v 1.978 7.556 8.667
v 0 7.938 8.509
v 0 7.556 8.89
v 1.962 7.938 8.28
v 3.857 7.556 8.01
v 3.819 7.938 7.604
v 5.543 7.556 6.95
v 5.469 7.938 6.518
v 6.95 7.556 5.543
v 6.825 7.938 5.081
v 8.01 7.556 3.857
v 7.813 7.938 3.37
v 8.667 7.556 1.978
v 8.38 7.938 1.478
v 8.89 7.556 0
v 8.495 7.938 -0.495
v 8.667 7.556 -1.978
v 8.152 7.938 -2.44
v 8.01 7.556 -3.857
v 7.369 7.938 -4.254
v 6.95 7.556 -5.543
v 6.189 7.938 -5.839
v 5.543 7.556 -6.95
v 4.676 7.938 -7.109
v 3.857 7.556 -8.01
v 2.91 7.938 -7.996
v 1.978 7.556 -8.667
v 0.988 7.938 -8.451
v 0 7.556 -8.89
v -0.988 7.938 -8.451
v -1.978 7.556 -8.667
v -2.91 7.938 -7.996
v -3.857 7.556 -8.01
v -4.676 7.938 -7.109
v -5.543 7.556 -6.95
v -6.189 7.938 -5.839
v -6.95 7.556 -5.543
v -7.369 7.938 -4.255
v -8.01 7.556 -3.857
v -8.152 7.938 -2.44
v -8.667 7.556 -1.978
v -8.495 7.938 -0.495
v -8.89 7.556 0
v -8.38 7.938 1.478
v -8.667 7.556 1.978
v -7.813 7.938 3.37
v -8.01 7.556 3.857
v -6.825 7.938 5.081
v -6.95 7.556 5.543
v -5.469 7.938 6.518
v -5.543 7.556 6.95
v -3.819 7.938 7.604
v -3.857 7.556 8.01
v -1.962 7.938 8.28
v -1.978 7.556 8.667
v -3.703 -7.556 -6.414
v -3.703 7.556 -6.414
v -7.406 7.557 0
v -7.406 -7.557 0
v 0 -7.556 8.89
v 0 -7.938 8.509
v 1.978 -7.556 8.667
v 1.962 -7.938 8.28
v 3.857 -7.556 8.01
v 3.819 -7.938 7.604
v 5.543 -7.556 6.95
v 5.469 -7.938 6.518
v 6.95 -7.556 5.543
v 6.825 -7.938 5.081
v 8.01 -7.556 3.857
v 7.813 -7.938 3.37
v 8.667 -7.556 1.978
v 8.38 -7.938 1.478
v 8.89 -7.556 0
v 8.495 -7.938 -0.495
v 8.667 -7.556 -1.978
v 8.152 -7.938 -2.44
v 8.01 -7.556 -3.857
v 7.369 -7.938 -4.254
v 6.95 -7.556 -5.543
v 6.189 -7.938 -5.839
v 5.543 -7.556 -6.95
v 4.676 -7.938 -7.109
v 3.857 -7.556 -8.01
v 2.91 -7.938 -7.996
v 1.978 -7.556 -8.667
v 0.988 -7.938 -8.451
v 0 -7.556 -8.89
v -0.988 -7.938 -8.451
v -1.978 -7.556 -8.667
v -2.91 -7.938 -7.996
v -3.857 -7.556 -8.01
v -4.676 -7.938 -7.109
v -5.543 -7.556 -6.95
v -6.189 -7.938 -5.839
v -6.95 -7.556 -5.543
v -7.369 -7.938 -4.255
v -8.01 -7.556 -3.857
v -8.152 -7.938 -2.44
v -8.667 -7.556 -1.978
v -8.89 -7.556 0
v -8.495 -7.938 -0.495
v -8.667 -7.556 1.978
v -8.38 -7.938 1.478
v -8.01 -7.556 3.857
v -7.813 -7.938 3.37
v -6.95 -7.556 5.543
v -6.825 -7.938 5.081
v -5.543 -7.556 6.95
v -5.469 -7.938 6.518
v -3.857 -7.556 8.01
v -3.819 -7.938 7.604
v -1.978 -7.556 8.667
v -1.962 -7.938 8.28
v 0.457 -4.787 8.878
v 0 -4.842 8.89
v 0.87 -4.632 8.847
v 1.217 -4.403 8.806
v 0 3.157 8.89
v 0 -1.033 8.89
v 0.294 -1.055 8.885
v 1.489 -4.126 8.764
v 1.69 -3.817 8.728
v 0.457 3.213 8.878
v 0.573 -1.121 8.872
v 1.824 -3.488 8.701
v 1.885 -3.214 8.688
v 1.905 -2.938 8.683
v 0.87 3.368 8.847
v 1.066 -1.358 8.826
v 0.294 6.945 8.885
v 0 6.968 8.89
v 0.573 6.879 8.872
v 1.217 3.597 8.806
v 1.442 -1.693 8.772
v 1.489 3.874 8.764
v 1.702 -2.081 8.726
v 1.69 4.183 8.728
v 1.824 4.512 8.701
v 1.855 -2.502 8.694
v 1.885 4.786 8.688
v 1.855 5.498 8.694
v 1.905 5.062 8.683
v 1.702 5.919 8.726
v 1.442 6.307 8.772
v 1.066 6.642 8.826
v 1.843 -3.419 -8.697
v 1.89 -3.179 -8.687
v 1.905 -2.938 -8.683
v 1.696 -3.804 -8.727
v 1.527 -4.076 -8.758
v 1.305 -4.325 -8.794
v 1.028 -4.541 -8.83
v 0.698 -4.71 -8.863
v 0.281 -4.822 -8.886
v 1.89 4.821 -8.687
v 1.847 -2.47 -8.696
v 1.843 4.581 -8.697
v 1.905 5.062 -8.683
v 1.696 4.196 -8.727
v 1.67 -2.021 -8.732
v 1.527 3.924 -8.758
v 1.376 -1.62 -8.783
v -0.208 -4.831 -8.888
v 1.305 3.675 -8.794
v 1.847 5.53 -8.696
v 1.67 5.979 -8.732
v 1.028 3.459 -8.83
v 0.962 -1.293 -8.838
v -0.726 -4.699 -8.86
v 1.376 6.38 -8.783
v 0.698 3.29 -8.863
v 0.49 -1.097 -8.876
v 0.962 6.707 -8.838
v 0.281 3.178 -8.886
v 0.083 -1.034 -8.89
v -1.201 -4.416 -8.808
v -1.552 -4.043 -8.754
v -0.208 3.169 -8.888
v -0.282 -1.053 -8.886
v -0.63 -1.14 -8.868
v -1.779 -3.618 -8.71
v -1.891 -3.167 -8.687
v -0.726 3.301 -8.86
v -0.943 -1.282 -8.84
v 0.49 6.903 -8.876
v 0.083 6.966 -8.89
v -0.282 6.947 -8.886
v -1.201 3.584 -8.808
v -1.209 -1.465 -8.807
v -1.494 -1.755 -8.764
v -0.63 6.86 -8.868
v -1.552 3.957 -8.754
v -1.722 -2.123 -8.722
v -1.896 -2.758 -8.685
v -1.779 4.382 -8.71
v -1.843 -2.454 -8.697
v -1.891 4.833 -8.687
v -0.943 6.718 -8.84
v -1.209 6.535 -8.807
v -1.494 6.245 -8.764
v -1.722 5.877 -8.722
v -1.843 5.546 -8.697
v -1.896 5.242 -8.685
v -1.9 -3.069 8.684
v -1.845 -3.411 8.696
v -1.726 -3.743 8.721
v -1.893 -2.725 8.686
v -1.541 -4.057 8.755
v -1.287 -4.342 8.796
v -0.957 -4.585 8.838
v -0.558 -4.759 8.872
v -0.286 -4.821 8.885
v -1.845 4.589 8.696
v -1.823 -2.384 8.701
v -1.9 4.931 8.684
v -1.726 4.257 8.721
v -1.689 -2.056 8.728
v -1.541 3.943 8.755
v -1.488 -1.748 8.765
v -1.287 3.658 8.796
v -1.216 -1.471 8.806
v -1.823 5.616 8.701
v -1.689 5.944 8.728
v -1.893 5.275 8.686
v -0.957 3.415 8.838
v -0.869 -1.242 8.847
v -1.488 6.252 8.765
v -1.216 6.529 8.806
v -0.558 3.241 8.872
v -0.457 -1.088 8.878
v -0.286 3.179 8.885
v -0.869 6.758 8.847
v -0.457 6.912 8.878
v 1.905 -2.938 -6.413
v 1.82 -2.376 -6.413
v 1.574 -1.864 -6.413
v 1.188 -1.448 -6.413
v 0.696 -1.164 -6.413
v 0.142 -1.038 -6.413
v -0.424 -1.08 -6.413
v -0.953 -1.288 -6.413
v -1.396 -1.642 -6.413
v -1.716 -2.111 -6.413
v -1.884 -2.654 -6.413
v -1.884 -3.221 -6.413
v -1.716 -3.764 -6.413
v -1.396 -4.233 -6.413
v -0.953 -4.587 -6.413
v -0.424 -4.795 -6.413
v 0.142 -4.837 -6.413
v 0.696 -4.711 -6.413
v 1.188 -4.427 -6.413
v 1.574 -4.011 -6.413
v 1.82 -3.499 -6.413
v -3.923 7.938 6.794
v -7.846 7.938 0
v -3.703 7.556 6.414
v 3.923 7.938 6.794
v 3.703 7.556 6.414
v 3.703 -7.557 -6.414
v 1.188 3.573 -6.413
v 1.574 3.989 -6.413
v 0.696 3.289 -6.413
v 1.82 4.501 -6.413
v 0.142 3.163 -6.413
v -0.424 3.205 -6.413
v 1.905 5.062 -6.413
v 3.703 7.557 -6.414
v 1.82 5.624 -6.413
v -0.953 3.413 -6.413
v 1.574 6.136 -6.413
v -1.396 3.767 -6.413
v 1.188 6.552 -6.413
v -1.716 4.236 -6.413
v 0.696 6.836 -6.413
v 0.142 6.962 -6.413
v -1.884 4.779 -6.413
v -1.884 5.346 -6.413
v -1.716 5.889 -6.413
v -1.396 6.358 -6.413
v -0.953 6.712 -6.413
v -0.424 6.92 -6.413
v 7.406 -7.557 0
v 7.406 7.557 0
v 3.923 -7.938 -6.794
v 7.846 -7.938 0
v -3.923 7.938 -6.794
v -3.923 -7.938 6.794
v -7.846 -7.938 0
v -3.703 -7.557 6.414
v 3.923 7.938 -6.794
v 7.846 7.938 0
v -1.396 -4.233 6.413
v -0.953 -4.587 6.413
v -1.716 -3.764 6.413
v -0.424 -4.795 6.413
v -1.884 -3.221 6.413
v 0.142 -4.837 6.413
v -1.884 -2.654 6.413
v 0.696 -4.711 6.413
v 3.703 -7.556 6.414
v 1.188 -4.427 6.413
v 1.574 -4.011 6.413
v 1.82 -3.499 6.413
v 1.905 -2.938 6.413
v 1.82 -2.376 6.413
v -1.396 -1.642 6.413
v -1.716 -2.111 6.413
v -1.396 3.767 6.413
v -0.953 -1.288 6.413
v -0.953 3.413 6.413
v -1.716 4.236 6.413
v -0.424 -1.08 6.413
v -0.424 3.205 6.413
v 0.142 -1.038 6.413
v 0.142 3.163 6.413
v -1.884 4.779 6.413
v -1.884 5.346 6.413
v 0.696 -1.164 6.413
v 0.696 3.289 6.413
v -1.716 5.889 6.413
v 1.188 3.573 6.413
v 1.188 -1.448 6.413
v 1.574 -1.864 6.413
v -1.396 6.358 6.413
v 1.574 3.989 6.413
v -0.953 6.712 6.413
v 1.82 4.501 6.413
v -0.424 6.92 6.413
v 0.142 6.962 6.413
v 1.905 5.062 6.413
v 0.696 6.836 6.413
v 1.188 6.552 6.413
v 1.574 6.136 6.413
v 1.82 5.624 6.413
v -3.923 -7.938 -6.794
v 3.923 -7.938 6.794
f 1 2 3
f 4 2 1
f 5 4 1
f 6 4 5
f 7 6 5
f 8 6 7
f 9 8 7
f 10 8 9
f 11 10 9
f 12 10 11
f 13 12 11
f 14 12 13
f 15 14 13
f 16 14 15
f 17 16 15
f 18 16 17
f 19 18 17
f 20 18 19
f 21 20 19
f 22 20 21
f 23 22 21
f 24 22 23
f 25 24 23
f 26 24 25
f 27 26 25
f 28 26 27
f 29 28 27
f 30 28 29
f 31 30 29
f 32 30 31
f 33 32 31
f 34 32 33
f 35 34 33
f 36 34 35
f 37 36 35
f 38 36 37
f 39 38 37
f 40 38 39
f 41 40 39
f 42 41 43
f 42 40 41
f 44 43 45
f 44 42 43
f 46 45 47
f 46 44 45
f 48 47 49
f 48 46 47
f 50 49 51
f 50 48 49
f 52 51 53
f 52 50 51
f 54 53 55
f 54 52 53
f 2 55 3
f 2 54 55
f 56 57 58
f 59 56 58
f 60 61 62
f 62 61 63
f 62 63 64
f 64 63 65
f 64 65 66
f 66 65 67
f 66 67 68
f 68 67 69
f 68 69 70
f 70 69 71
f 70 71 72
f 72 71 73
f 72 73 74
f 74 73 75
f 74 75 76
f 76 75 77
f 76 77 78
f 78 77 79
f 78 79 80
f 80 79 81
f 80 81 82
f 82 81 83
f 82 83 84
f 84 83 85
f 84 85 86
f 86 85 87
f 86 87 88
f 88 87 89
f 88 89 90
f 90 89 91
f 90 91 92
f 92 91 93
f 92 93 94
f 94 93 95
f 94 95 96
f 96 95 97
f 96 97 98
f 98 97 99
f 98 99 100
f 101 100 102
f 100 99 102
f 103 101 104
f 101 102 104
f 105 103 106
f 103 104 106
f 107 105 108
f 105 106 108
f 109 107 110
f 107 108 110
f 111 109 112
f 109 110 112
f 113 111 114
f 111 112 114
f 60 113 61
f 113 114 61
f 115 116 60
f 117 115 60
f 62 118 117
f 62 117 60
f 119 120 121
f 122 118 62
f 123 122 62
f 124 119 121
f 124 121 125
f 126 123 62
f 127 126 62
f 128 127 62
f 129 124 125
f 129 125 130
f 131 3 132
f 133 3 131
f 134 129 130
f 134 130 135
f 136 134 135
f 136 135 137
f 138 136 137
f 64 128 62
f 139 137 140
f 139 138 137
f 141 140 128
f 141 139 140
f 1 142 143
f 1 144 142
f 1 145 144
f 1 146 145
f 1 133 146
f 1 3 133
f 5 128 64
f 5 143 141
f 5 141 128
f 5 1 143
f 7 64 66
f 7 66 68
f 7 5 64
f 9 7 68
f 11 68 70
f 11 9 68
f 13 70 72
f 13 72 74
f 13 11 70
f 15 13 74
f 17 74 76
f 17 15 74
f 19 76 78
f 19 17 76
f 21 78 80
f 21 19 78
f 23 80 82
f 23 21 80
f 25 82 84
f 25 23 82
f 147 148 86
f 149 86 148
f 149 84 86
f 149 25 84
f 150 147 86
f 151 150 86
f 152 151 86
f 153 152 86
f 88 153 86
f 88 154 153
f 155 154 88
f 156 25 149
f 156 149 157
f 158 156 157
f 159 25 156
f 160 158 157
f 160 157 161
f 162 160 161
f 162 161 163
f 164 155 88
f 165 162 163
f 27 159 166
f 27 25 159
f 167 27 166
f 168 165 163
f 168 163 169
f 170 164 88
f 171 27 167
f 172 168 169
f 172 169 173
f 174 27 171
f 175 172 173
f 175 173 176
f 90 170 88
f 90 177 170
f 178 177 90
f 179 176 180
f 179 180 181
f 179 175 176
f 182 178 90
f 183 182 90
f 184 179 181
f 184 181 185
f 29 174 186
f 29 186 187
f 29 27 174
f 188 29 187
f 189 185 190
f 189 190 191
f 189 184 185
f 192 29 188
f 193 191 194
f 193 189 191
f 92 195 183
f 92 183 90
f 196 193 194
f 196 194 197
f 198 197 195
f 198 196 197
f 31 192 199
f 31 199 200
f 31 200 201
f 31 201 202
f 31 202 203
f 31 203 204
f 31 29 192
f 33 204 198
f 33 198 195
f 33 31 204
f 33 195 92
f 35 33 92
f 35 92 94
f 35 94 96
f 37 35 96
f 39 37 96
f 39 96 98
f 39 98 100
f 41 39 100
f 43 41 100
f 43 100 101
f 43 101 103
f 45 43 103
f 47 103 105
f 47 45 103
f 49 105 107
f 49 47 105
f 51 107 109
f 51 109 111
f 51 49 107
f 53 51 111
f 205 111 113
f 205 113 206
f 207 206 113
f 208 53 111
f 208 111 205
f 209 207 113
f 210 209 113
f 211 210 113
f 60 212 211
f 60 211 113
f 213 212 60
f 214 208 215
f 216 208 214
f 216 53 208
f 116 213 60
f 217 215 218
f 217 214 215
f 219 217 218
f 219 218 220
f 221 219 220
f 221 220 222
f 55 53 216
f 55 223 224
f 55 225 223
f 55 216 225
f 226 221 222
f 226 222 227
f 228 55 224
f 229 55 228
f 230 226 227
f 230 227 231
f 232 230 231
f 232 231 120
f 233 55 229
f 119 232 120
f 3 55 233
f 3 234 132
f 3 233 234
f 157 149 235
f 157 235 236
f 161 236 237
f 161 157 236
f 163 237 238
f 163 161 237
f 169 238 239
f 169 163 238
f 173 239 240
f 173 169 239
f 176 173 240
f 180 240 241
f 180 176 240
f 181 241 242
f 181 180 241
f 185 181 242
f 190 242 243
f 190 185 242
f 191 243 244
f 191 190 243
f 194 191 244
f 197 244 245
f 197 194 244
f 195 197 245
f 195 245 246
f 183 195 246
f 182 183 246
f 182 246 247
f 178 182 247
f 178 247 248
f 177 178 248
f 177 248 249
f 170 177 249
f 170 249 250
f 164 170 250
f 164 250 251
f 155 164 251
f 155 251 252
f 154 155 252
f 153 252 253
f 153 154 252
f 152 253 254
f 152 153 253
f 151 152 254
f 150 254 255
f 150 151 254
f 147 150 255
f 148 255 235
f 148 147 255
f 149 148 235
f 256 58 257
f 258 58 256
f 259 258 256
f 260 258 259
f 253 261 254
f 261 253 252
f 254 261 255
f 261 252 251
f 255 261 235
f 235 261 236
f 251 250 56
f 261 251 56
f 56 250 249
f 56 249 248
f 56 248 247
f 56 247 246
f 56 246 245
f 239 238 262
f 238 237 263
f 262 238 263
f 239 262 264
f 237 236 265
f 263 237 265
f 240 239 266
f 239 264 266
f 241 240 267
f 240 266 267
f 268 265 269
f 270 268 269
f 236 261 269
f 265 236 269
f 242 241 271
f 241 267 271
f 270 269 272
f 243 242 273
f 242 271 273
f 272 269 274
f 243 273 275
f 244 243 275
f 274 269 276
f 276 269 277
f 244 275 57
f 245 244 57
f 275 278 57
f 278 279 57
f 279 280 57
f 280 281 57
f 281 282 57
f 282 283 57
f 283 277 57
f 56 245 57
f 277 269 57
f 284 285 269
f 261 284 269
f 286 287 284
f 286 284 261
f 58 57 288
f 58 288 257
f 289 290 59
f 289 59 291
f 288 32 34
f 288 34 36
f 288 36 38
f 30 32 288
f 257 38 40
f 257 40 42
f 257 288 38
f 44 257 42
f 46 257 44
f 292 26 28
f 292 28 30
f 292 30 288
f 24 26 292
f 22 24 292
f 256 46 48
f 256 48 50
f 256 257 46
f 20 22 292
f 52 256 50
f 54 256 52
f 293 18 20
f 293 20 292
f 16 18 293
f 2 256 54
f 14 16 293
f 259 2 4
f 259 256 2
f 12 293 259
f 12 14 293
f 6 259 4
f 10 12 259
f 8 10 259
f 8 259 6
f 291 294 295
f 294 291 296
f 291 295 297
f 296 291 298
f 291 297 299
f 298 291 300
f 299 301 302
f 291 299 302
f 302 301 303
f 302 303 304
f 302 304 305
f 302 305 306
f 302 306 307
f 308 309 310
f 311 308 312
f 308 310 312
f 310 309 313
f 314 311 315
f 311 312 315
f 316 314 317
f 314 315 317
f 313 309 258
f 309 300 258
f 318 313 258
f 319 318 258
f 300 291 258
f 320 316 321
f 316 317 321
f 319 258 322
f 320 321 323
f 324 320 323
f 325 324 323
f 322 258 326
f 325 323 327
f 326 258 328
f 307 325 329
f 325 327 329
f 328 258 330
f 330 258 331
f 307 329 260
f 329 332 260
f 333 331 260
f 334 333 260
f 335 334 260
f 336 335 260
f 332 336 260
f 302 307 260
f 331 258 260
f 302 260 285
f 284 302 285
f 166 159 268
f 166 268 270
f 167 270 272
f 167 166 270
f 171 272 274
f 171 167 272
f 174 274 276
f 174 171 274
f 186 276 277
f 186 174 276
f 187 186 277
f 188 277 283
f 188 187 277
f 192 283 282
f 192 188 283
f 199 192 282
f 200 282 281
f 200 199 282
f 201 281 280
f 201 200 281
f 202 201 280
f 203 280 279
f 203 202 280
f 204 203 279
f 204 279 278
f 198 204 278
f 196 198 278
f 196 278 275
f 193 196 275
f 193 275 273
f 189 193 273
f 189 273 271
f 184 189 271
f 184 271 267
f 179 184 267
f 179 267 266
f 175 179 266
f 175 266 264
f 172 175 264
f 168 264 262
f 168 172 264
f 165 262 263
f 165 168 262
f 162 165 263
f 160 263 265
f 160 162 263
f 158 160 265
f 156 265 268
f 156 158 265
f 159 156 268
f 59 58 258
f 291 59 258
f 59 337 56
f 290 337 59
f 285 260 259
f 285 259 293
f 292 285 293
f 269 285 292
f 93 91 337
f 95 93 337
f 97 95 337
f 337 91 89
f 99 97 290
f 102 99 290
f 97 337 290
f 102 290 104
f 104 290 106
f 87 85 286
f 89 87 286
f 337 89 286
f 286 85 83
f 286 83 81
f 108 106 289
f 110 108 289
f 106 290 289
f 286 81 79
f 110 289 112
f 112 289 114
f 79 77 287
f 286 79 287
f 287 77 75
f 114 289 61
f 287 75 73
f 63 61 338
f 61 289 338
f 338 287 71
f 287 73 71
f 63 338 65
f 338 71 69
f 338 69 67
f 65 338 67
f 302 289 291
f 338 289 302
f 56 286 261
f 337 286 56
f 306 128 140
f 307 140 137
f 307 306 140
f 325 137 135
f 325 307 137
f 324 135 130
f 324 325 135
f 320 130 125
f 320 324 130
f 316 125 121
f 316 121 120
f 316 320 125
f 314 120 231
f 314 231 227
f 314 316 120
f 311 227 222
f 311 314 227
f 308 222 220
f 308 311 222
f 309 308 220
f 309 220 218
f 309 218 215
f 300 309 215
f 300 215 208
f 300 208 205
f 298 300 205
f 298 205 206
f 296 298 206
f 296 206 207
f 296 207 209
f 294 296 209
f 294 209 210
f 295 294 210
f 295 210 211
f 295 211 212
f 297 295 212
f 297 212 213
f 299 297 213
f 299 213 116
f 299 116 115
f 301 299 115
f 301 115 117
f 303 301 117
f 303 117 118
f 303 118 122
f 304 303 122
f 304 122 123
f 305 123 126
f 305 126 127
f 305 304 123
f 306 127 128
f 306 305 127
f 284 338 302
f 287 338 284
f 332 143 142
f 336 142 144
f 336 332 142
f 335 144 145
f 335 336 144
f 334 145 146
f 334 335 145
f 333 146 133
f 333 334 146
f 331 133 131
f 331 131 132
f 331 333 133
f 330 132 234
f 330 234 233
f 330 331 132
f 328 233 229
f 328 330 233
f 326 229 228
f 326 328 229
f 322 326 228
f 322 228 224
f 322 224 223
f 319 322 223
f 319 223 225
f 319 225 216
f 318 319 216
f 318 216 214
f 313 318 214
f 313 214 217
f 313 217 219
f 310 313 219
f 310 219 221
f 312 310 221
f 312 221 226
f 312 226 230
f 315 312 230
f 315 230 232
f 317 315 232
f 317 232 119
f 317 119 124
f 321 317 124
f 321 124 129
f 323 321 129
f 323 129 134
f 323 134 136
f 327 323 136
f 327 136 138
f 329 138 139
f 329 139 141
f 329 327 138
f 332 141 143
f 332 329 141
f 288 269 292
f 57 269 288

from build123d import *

# Parameters (mm, degrees)
SKETCH1_R               = 8.89
BOSS_EXTRUDE1_DEPTH     = 7.9375
CHAMFER1_SIZE           = 0.381
CUT_EXTRUDE1_DEPTH      = 15.868359232
CUT_EXTRUDE1_DEPTH_BACK = 15.868359232
SKETCH3_R               = 1.905


with BuildPart() as part:
    # Sketch1 → Boss-Extrude1 (new, symmetric)
    with BuildSketch(Plane(origin=(0, 0, 0), x_dir=(1, 0, 0), z_dir=(0, 1, 0))):
        with Locations(Location((0, 0, 0), (0, 0, 270))):
            Circle(SKETCH1_R)
        Polygon((3.702835951, -6.4135), (7.405671903, 0), (3.702835951, 6.4135), (-3.702835951, 6.4135), (-7.405671903, 0), (-3.702835951, -6.4135), align=None, mode=Mode.SUBTRACT)
    extrude(amount=BOSS_EXTRUDE1_DEPTH, both=True)

    # Chamfer1
    chamfer1_edges = [part.edges().sort_by_distance(p)[0] for p in [
        (5.554253927, -7.9375, -3.20675),
        (0, -7.9375, -6.4135),
        (-5.554253927, -7.9375, -3.20675),
        (-5.554253927, -7.9375, 3.20675),
        (0, 7.9375, 6.4135),
        (5.554253927, 7.9375, 3.20675),
        (5.554253927, 7.9375, -3.20675),
        (0, 7.9375, -6.4135),
        (-5.554253927, 7.9375, -3.20675),
        (-5.554253927, 7.9375, 3.20675),
        (0, -7.9375, -8.89),
        (0, 7.9375, -8.89),
        (0, -7.9375, 6.4135),
        (5.554253927, -7.9375, 3.20675),
    ]]
    chamfer(chamfer1_edges, length=CHAMFER1_SIZE)

    # Sketch3 → Cut-Extrude1 (cut, two sides: drawn at the far end of the back side and taken through both)
    with BuildSketch(Plane.XY.offset(-CUT_EXTRUDE1_DEPTH_BACK)):
        with Locations((0, -2.9375)):
            Circle(SKETCH3_R)
        with Locations((0, 5.0625)):
            Circle(SKETCH3_R)
    extrude(amount=CUT_EXTRUDE1_DEPTH + CUT_EXTRUDE1_DEPTH_BACK, mode=Mode.SUBTRACT)


solid = part.part
